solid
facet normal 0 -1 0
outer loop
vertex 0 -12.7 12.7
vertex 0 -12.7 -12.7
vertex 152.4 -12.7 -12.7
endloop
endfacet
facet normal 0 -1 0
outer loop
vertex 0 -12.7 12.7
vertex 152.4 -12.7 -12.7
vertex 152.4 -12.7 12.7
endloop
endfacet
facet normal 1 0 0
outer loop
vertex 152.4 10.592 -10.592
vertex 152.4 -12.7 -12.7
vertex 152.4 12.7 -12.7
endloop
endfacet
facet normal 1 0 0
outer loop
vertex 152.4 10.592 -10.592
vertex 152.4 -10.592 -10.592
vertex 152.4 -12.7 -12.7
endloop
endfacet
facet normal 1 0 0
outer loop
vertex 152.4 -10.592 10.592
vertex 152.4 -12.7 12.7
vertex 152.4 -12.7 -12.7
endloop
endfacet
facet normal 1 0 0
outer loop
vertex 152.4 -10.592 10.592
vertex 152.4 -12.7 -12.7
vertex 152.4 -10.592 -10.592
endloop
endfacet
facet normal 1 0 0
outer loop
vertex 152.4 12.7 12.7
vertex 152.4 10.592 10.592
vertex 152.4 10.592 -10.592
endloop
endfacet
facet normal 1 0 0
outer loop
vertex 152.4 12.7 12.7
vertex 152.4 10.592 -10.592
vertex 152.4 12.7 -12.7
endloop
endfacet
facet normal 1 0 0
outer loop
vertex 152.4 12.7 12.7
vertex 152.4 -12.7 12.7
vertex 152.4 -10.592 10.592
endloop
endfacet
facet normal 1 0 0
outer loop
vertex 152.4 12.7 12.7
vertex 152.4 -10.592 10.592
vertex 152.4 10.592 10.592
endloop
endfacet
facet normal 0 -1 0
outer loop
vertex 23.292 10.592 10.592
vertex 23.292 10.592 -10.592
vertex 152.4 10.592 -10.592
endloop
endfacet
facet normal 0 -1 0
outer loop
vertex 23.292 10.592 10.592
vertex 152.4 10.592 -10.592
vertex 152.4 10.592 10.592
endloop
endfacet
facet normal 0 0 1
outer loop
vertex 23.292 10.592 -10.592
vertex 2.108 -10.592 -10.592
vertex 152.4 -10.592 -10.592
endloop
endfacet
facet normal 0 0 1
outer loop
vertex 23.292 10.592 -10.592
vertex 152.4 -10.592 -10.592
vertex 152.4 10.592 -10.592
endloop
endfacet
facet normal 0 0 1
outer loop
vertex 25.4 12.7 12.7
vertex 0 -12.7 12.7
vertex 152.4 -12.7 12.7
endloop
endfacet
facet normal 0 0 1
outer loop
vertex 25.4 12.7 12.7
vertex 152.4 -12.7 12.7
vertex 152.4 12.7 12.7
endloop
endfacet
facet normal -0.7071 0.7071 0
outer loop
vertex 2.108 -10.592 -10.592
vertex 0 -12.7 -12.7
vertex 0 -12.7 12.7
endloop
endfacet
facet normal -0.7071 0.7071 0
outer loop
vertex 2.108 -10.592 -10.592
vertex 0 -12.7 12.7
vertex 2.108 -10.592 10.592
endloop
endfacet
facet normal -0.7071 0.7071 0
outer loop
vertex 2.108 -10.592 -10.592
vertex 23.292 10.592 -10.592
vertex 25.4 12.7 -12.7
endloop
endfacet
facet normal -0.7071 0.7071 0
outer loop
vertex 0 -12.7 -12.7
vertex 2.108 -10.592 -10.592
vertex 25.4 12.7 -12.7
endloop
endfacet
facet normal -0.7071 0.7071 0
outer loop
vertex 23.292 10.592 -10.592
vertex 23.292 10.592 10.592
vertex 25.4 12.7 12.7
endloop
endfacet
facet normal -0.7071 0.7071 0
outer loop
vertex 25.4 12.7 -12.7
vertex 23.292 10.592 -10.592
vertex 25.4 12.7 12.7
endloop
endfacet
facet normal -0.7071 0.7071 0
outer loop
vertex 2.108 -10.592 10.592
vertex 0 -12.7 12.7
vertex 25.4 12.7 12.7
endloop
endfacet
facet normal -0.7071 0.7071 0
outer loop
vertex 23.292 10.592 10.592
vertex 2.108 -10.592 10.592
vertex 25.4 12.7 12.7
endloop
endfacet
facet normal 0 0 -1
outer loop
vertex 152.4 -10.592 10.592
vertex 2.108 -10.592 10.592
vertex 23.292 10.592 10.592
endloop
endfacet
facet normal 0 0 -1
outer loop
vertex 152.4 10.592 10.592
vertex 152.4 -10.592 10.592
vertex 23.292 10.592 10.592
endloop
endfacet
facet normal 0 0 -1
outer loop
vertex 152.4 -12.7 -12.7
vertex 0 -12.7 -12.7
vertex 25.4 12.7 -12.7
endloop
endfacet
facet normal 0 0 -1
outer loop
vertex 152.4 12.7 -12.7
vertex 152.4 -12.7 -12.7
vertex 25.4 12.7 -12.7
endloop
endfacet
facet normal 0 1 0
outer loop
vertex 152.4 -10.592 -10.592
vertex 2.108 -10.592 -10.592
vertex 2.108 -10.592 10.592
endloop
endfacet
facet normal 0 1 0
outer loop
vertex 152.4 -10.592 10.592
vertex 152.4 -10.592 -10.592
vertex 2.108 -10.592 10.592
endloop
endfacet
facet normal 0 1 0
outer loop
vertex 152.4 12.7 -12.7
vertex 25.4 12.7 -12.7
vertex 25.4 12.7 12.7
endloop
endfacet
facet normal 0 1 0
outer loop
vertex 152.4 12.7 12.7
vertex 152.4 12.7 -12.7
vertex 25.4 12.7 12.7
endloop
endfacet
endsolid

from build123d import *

# Parameters (mm, degrees)
SKETCH1_W                              = 25.4
SKETCH1_H                              = 25.4
SKETCH1_W_2                            = 21.1836
SKETCH1_H_2                            = 21.1836
AL_TUBE_SQUARE_1_SQ_X_083_WALL_1_DEPTH = 152.4
CORTAR_EXTRUIR1_DEPTH                  = 58.928


with BuildPart() as part:
    # Sketch1 → Al tube (square) 1 SQ X .083 WALL(1) (new body)
    with BuildSketch(Plane.YZ):
        Rectangle(SKETCH1_W, SKETCH1_H)
        Rectangle(SKETCH1_W_2, SKETCH1_H_2, mode=Mode.SUBTRACT)
    extrude(amount=AL_TUBE_SQUARE_1_SQ_X_083_WALL_1_DEPTH)

    # Croquis3 → Cortar-Extruir1 (cut)
    with BuildSketch(Plane.XY.offset(12.7)):
        Polygon((0, -12.7), (25.4, 12.7), (0, 12.7), align=None)
    extrude(amount=-CORTAR_EXTRUIR1_DEPTH, mode=Mode.SUBTRACT)


solid = part.part
